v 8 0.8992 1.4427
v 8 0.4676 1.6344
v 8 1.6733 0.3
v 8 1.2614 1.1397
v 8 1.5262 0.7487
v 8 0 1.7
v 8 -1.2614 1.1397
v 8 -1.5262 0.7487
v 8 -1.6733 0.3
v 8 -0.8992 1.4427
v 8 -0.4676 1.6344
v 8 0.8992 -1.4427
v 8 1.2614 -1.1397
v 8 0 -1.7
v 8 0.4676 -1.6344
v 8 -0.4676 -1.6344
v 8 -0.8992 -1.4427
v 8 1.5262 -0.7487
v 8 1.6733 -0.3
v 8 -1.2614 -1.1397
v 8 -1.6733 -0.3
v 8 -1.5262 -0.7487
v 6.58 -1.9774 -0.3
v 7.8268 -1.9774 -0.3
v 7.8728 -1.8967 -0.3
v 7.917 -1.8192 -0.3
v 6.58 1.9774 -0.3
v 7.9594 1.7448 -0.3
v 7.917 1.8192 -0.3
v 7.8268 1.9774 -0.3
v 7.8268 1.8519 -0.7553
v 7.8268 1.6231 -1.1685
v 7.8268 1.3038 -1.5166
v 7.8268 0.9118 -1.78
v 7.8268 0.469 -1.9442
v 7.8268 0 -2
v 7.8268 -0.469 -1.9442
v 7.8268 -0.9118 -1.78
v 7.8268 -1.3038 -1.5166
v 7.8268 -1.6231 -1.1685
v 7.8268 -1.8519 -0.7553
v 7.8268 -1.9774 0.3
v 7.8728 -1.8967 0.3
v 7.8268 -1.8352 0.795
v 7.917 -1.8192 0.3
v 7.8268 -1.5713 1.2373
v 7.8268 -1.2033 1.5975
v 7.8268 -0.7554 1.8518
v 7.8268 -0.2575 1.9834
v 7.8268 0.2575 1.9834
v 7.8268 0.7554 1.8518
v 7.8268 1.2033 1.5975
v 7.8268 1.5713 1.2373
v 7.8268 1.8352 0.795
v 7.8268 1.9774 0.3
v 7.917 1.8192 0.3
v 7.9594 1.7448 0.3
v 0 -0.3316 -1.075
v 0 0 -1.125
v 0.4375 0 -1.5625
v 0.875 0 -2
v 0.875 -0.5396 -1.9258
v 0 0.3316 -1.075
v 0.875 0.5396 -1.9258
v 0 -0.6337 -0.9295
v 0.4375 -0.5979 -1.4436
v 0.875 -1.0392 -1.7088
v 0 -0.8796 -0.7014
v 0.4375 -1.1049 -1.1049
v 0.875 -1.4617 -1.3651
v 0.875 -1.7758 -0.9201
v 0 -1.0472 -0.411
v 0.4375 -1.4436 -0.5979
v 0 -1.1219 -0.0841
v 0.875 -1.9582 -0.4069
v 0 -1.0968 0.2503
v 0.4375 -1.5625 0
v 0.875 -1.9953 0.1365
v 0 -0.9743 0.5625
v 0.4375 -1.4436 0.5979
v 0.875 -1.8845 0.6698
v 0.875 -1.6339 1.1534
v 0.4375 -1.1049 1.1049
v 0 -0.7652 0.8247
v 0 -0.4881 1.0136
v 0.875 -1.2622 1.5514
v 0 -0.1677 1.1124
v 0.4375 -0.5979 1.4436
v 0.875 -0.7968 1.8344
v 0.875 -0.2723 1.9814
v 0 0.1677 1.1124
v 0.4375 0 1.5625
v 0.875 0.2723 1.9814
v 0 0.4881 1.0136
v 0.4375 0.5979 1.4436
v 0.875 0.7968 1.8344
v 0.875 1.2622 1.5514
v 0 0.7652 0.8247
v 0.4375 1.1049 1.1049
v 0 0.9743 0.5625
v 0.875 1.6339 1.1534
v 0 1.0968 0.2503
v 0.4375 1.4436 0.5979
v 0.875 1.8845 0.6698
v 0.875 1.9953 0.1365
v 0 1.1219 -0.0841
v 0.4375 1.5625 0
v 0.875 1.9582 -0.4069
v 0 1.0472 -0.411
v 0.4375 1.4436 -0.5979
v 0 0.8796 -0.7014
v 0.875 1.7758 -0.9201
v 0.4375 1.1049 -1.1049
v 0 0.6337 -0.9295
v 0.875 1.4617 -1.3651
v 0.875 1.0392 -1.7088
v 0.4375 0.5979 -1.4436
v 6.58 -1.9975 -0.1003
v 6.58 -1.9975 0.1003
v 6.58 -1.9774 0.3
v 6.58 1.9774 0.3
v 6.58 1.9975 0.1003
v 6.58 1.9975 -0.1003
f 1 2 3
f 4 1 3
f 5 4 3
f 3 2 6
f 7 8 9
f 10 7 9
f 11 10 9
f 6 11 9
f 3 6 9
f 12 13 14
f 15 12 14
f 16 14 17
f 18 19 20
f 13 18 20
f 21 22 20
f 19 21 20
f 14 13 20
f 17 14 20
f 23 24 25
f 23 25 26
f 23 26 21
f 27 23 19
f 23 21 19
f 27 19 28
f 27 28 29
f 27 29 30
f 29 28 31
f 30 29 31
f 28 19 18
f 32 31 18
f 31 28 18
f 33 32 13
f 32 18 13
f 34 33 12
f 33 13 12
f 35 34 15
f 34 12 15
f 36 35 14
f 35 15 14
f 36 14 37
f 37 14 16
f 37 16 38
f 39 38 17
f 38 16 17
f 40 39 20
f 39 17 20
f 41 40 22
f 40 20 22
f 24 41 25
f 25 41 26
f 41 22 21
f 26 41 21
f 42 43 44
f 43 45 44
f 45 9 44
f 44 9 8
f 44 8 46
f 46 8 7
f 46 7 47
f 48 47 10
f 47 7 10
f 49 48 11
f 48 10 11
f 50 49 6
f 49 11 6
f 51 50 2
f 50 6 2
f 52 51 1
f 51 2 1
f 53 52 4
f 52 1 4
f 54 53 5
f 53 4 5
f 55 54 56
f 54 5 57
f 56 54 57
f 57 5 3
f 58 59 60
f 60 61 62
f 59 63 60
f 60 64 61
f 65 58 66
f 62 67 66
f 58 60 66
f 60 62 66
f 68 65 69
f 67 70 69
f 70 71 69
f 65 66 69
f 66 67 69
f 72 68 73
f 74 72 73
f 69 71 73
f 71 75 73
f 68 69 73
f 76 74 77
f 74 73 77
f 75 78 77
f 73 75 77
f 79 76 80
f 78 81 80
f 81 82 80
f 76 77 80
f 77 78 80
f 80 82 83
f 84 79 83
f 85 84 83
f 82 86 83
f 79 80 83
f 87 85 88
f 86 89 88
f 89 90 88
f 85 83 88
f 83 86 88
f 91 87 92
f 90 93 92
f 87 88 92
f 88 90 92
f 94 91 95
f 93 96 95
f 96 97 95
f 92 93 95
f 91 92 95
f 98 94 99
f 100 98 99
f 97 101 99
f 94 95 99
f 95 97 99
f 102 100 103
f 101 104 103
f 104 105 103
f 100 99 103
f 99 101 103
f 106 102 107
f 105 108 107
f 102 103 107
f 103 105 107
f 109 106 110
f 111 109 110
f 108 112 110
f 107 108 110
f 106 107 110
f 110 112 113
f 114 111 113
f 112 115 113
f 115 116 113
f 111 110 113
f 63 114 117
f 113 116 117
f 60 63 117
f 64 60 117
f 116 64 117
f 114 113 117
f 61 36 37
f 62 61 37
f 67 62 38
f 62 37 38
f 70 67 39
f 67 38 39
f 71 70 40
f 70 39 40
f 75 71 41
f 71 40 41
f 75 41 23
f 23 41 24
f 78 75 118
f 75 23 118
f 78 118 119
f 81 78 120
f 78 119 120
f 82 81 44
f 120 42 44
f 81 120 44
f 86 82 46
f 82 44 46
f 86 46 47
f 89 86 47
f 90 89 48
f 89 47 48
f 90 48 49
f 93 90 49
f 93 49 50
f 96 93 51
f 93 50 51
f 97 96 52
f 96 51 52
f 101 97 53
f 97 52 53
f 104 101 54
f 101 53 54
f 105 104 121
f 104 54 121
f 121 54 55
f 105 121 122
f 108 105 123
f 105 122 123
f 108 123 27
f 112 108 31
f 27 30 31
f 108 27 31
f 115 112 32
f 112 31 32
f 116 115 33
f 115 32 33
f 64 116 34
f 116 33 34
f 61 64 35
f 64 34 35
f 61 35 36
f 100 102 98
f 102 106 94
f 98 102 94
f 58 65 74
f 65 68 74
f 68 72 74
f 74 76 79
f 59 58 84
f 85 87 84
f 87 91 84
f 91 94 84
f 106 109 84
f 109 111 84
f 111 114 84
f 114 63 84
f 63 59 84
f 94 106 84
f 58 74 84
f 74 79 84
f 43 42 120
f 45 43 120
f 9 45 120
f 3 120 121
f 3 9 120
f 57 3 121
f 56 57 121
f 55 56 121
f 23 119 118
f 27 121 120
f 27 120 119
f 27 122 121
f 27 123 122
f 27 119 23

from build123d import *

# Parameters (mm, degrees)
SKICA2_W                 = 0.6
SKICA2_H                 = 4
ODEBRAT_VYSUNUT_M1_DEPTH = 1.42


with BuildPart() as part:
    # Skica1 → Otočit kolem osy1 (revolve)
    with BuildSketch(Plane(origin=(0, 0, 0), x_dir=(1, 0, 0), z_dir=(0, 1, 0))):
        Polygon((0, 0), (0, 1.125), (0.875, 2), (7.826794919, 2), (8, 1.7), (8, 0), align=None)
    revolve(axis=Axis((8, 0, 0), (-1, 0, 0)))

    # Skica2 → Odebrat vysunutím1 (cut)
    with BuildSketch(Plane(origin=(8, 0, 0), x_dir=(0, 0, -1), z_dir=(1, 0, 0))):
        Rectangle(SKICA2_W, SKICA2_H)
    extrude(amount=-ODEBRAT_VYSUNUT_M1_DEPTH, mode=Mode.SUBTRACT)


solid = part.part
